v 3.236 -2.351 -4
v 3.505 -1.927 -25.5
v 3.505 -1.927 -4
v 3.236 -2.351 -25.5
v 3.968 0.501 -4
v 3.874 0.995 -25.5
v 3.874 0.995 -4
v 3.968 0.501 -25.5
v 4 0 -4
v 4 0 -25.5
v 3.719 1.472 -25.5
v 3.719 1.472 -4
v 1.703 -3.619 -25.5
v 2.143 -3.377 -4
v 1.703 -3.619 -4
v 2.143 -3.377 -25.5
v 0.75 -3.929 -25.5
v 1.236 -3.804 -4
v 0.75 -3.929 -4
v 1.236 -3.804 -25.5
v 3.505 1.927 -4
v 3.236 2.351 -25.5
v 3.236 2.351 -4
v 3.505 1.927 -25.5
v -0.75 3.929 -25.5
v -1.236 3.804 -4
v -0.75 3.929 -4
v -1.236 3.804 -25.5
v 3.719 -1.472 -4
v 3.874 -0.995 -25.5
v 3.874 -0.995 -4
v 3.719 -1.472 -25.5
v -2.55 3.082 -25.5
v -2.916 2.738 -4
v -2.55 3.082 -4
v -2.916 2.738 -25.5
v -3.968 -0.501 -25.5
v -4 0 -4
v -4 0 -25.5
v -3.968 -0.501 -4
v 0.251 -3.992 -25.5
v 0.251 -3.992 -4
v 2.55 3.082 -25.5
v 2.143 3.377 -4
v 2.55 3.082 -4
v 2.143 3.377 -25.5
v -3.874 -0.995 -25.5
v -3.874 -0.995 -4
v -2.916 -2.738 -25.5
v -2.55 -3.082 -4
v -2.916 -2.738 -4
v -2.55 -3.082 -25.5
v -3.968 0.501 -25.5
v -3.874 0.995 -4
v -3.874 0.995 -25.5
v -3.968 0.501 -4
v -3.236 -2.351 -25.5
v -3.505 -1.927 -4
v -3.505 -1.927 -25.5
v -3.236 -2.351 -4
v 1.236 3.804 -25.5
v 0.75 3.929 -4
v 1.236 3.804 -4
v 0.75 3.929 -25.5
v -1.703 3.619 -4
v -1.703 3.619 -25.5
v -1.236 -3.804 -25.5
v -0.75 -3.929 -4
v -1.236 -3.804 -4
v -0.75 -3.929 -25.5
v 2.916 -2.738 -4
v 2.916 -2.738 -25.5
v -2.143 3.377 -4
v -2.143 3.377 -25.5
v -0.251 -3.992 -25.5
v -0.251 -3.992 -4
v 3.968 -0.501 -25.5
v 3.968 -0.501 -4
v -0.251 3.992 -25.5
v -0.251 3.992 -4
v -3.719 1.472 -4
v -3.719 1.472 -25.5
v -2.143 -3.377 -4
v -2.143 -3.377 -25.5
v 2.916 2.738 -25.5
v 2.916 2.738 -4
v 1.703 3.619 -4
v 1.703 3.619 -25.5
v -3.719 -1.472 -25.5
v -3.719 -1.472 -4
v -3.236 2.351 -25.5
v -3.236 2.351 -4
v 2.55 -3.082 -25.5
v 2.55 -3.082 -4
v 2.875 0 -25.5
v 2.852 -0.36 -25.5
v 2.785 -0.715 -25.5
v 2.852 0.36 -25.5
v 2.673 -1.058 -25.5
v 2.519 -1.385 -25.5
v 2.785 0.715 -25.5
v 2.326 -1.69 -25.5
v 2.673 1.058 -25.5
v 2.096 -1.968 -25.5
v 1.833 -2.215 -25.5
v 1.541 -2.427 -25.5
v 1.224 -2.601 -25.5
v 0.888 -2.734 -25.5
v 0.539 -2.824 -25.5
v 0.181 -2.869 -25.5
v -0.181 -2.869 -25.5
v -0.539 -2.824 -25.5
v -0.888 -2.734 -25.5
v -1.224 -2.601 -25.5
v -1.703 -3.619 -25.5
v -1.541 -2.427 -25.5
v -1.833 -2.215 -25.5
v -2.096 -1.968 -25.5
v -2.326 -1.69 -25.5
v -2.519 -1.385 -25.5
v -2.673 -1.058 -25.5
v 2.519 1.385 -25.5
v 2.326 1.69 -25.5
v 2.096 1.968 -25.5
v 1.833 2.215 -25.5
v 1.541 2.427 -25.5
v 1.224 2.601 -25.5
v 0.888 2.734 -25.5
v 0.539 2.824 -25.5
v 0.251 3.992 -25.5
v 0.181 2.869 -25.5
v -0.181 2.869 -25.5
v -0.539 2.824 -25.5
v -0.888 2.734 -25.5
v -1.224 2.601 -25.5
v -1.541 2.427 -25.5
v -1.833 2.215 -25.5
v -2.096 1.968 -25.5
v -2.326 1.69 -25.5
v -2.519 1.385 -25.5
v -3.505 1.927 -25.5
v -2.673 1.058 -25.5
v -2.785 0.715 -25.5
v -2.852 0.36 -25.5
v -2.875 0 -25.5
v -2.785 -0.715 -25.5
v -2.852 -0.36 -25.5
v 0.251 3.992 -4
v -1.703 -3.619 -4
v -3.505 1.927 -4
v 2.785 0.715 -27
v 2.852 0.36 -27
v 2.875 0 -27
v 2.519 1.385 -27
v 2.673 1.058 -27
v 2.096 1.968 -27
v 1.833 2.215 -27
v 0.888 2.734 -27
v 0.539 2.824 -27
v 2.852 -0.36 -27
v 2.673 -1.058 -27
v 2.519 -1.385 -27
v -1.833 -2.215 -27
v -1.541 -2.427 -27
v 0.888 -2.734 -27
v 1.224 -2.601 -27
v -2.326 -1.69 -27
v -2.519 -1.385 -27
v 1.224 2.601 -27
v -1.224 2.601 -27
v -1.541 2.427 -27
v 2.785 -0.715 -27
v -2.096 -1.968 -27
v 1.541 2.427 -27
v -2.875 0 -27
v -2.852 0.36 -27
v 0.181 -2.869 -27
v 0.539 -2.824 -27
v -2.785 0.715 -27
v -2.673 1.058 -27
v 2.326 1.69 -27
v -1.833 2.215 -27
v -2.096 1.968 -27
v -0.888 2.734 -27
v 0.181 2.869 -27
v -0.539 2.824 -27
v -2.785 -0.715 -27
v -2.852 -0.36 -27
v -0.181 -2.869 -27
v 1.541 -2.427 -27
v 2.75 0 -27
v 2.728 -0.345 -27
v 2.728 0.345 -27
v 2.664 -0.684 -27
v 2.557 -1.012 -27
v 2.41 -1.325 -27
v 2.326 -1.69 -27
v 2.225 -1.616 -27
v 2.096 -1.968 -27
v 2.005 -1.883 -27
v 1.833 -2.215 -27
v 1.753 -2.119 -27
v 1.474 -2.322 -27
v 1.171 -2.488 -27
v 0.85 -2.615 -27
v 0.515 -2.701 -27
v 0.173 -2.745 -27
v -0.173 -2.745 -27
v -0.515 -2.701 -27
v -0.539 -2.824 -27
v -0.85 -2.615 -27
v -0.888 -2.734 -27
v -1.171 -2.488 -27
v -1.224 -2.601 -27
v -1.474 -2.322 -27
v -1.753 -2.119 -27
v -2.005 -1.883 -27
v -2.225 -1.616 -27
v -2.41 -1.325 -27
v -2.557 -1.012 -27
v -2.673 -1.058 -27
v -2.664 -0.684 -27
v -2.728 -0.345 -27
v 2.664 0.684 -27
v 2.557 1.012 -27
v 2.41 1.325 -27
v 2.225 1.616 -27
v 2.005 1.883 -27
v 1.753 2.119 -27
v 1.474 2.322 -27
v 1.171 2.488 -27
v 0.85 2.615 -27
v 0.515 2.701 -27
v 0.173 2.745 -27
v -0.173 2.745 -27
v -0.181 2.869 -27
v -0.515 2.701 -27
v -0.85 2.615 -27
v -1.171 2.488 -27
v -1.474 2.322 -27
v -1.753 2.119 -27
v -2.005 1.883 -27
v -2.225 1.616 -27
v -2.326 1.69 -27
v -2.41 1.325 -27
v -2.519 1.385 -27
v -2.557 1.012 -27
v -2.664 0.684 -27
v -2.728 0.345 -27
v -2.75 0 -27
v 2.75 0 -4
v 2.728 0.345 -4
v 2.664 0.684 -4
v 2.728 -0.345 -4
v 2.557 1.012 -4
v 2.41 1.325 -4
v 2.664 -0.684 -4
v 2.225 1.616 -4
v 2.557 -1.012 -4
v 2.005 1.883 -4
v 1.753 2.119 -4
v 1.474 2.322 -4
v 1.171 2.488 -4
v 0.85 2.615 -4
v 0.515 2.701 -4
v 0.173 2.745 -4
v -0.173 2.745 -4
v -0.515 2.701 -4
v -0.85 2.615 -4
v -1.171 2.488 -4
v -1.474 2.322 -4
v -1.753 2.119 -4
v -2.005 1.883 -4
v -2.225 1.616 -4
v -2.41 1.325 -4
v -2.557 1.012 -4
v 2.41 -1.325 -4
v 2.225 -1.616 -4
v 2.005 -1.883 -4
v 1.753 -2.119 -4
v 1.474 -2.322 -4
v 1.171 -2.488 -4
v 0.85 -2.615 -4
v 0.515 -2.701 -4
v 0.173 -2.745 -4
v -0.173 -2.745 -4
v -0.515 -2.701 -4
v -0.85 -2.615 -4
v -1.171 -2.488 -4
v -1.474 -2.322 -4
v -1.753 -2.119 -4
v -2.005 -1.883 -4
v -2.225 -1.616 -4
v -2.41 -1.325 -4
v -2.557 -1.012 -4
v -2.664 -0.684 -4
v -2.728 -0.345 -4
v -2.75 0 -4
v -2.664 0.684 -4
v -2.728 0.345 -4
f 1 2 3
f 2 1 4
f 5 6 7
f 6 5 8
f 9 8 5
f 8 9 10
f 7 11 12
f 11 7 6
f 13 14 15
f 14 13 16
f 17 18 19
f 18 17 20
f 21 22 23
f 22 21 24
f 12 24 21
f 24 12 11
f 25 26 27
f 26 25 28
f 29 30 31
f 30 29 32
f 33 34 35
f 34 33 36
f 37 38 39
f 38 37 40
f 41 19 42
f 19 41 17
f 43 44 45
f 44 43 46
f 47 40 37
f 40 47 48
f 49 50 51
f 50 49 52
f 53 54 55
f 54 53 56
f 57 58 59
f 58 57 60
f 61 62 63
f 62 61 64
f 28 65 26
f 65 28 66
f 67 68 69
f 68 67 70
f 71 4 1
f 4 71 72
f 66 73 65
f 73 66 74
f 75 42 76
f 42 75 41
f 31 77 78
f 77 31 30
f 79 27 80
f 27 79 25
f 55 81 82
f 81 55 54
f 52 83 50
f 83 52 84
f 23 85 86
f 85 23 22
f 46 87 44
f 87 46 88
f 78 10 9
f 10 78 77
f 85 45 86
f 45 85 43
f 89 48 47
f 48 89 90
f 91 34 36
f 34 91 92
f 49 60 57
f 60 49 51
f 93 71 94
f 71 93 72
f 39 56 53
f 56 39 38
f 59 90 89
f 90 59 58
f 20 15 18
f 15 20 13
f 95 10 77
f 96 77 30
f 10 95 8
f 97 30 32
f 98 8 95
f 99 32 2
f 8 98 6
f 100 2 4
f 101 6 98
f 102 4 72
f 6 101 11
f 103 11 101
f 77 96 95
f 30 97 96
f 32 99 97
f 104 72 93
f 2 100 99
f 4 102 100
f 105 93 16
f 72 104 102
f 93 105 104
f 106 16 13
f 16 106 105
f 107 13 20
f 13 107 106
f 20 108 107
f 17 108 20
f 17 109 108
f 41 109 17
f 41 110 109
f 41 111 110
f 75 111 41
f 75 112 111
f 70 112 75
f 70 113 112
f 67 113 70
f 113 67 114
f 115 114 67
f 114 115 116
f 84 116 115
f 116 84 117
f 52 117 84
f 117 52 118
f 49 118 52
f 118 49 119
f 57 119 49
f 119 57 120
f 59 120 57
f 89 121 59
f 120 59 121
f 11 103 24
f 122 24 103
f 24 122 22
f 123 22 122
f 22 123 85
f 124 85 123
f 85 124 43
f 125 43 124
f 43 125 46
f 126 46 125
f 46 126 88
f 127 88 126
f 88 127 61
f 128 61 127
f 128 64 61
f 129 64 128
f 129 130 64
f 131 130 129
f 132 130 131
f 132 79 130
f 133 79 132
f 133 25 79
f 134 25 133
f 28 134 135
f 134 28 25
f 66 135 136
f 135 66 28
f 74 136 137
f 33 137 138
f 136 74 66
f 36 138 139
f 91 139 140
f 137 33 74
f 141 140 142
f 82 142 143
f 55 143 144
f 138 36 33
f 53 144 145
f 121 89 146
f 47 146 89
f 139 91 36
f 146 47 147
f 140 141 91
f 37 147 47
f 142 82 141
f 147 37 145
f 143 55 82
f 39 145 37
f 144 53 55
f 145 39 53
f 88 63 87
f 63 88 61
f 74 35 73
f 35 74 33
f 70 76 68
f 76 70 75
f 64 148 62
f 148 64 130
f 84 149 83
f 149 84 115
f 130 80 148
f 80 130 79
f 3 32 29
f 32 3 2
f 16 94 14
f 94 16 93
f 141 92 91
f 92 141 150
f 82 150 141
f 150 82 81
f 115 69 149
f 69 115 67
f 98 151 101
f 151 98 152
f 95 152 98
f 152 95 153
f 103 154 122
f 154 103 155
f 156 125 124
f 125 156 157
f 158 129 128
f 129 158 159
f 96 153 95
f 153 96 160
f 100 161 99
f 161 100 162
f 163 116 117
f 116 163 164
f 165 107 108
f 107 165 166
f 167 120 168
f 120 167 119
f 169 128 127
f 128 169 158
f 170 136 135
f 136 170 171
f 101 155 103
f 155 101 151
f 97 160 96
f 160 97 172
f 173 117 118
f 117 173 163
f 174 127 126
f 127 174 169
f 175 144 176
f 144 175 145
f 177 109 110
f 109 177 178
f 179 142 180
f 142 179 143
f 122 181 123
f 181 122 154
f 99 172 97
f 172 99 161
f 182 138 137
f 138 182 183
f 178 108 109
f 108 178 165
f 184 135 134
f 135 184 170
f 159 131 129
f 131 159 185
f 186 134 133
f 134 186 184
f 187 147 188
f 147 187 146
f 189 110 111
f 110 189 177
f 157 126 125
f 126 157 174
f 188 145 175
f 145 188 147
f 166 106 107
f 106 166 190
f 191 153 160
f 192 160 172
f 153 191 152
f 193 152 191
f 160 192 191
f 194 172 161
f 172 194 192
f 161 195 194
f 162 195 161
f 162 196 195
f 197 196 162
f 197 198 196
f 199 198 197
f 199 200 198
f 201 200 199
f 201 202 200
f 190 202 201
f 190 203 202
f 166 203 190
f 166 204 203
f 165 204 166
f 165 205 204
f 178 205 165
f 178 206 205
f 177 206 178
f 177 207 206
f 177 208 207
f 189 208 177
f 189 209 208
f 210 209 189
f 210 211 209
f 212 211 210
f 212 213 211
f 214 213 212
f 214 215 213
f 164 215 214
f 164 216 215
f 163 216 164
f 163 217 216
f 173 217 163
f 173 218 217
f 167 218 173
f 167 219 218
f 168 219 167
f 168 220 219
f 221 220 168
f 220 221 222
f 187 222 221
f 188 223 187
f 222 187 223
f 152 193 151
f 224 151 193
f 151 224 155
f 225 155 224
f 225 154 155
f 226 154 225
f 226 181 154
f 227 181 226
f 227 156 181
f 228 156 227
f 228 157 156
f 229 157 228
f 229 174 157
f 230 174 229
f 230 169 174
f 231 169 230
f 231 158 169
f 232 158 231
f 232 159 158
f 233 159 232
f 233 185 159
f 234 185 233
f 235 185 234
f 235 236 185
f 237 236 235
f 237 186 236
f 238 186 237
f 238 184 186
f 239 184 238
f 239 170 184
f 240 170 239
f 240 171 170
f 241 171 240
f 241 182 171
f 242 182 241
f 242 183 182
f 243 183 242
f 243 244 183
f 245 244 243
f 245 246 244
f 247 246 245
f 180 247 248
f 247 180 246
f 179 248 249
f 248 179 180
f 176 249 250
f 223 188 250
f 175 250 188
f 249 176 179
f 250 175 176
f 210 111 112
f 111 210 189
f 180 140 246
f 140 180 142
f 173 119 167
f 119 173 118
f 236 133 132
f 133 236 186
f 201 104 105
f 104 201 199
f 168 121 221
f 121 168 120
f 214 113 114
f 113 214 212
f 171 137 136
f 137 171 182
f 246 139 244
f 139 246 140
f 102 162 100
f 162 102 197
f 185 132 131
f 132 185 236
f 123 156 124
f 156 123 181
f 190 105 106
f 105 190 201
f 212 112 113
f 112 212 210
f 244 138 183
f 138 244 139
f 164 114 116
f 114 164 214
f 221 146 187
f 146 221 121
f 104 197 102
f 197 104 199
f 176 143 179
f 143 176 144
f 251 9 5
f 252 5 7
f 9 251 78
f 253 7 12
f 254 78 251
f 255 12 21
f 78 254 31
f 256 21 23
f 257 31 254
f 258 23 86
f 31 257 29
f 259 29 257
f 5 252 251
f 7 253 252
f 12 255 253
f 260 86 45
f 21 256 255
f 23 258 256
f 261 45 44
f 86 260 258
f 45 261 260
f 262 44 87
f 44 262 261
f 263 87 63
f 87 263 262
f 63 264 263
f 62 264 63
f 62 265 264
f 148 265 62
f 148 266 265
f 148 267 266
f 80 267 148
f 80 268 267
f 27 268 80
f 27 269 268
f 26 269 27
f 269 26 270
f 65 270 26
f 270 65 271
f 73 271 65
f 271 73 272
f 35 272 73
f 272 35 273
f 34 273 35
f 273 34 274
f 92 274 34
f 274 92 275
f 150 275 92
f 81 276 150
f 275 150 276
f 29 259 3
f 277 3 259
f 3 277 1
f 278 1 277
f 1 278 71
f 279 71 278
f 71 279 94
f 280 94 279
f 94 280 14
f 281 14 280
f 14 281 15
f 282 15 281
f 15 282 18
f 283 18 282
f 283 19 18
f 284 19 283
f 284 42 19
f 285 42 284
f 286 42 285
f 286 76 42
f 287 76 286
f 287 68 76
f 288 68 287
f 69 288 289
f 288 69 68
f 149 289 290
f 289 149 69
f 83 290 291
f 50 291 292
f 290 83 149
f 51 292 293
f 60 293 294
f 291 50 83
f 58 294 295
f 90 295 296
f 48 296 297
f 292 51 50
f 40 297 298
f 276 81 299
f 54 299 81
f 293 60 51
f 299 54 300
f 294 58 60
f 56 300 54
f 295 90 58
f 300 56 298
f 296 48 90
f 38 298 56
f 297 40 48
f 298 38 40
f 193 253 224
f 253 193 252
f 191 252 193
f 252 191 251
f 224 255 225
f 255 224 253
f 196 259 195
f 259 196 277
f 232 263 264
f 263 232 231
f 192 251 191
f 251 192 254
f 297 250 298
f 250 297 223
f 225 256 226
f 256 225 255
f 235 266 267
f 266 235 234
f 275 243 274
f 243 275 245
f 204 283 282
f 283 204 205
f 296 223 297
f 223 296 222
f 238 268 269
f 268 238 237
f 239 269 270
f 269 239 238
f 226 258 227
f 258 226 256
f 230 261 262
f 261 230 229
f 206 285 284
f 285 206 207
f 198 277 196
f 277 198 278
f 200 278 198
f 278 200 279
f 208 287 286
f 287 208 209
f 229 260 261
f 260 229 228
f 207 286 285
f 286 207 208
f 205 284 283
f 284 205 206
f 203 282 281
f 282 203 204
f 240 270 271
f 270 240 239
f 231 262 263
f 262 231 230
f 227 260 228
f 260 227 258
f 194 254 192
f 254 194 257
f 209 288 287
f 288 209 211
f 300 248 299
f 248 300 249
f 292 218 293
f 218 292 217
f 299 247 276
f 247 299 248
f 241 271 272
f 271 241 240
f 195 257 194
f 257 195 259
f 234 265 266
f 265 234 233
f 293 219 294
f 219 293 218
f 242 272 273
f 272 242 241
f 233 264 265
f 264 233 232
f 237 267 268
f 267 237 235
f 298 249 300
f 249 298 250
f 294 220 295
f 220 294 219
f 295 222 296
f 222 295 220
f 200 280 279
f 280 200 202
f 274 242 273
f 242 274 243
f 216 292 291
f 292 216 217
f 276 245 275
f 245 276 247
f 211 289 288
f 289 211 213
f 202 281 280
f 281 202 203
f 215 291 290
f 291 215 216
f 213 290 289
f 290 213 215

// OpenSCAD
$fn = 50;

difference() {
	union() {
		translate(v = [0, 0, -25.5]) {
			cylinder(h = 25.5, r = 4.0);
		}
		#translate(v = [0, 0, -27.0]) {
			cylinder(h = 27, r = 2.875);
		}
	}
	union() {
		translate(v = [0, 0, 0]) {
			rotate(a = [0, 0, 0]) {
				difference() {
					union() {
						translate(v = [0, 0, -4]) {
							linear_extrude(height = 4) {
								polygon(points = [[4.8468, 0.0], [2.4234000000000004, 4.197451927062417], [-2.423399999999999, 4.197451927062417], [-4.8468, 5.935618106107392e-16], [-2.423400000000002, -4.197451927062416], [2.423399999999997, -4.197451927062419]]);
							}
						}
					}
					union();
				}
			}
		}
		#translate(v = [0, 0, -100.0]) {
			cylinder(h = 200, r = 2.75);
		}
	}
}
